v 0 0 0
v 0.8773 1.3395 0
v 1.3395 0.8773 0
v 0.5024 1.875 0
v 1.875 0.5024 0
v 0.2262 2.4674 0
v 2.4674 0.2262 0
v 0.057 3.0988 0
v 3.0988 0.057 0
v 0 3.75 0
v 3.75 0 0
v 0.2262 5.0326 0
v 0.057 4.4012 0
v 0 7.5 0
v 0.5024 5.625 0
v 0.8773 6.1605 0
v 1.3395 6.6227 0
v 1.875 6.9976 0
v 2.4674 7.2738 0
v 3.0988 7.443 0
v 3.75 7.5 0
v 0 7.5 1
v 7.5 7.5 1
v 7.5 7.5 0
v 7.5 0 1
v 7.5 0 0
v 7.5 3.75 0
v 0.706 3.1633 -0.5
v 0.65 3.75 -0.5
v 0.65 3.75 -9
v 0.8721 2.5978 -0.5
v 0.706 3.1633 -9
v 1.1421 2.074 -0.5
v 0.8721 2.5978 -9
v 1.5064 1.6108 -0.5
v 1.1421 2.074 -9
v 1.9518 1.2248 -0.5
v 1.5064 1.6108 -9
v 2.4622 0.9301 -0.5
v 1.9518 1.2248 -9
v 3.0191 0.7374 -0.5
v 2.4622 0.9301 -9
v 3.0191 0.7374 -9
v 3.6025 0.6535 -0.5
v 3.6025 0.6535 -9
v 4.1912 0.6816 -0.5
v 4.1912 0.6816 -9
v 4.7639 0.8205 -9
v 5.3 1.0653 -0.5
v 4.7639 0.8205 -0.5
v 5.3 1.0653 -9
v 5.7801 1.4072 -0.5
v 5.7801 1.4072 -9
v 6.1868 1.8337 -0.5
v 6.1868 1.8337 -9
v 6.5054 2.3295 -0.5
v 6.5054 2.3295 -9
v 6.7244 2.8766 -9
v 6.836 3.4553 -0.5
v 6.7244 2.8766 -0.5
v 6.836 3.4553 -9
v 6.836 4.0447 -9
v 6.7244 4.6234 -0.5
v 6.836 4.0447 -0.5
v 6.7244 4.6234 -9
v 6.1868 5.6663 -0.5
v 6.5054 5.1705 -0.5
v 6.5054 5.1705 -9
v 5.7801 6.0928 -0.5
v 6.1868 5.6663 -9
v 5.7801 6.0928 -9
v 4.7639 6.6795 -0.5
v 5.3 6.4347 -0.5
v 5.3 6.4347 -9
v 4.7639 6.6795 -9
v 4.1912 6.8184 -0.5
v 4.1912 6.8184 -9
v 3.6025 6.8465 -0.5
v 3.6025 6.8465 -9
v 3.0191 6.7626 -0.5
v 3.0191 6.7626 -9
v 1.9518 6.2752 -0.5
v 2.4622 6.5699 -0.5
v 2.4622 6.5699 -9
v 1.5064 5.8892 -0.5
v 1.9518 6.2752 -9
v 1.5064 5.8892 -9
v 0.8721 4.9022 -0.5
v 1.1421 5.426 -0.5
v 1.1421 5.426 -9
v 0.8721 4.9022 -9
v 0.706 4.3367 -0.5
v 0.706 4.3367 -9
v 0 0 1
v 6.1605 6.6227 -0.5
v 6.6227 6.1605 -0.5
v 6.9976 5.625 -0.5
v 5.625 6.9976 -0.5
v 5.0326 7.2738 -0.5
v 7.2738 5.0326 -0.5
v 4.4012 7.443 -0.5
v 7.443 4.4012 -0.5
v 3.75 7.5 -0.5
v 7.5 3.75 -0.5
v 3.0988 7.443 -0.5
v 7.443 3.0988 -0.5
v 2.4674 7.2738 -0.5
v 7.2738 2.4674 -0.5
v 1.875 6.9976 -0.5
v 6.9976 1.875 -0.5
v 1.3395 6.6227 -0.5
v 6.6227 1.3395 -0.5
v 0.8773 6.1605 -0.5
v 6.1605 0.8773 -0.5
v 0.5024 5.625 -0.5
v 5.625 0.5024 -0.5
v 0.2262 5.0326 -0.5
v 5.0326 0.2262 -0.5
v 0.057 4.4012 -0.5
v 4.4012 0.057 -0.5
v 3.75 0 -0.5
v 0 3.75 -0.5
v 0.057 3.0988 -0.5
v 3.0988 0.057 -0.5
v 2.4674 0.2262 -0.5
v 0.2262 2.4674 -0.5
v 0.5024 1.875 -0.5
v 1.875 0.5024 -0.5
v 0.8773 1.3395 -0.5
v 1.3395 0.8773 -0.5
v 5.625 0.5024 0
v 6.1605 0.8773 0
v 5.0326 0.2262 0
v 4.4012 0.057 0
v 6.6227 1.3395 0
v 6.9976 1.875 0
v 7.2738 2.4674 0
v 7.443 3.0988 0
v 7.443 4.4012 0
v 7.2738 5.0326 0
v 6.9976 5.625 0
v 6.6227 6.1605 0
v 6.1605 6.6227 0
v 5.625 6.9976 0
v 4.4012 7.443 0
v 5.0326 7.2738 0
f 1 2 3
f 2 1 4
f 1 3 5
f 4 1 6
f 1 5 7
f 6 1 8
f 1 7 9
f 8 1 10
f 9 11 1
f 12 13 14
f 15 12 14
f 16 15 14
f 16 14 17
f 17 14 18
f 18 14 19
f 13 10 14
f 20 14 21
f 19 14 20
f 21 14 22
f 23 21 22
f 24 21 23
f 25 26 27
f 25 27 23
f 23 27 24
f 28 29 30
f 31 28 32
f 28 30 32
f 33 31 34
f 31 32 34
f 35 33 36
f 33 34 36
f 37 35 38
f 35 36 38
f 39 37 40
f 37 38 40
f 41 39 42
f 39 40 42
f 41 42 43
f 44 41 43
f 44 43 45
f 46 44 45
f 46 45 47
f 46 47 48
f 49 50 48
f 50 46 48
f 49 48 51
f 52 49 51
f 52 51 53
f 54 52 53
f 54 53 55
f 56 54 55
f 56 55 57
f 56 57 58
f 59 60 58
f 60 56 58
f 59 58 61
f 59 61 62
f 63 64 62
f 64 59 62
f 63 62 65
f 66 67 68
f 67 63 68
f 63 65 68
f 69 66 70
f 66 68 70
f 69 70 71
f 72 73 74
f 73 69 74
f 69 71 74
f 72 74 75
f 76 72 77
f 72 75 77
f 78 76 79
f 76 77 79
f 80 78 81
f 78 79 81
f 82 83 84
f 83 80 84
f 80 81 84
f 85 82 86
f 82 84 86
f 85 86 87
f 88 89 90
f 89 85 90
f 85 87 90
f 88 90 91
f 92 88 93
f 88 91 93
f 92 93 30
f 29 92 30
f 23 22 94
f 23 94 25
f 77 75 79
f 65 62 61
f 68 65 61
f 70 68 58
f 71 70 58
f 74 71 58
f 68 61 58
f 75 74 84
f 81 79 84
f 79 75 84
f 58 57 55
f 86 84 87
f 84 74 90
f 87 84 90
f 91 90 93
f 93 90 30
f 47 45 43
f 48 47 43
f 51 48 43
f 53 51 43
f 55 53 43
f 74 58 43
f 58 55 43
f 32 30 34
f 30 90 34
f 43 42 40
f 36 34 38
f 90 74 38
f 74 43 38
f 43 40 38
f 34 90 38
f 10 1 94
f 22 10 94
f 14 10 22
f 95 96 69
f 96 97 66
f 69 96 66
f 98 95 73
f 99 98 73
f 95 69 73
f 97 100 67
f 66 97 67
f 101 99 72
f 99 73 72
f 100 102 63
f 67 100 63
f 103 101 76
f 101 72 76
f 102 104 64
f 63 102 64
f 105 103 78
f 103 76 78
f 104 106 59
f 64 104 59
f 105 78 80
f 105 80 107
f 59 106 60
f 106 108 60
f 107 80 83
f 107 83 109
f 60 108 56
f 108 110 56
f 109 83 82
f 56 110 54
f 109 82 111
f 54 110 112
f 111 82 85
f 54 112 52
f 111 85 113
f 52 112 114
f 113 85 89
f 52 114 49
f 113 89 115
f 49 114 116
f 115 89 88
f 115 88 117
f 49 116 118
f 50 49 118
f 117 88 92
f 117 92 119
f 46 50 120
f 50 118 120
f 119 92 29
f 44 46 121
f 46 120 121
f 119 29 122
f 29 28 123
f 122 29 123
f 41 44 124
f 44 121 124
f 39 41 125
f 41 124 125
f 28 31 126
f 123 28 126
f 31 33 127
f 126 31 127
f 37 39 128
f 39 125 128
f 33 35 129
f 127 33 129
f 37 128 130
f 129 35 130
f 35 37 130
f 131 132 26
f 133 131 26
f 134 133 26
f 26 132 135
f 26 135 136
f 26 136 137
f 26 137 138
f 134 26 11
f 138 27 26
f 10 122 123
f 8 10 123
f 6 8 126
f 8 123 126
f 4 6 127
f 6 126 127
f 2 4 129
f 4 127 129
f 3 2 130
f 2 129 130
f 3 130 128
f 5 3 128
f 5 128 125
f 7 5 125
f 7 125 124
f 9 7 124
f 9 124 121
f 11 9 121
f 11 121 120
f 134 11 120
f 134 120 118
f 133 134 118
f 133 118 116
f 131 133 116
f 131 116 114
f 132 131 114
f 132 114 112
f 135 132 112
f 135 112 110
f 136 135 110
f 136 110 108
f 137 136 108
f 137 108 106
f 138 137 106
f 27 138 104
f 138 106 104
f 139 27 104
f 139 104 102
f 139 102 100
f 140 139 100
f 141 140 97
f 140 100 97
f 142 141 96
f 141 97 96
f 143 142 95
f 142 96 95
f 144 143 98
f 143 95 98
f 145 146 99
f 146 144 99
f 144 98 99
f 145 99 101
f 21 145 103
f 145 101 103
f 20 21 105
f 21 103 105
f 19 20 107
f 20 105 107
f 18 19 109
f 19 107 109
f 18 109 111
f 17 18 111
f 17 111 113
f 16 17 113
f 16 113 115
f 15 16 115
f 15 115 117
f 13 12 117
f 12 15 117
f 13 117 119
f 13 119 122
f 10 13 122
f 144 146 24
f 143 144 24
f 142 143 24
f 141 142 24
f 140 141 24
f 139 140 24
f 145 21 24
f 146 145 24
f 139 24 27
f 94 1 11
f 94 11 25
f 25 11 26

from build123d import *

# Parameters (mm, degrees)
CIRCLE_R         = 3.75
EXTRUDE001_DEPTH = 1.5
CIRCLE001_R      = 3.1
EXTRUDE_DEPTH    = 10
BOX_W            = 7.5
BOX_H            = 7.5
BOX_DEPTH        = 1


with BuildPart() as extrude001:
    # Circle → Extrude001 (new body)
    with BuildSketch(Plane(origin=(3.75, 3.75, 1), x_dir=(-1, 0, 0), z_dir=(0, 0, 1))):
        Circle(CIRCLE_R)
    extrude(amount=EXTRUDE001_DEPTH)


with BuildPart() as extrude001_1:
    # Extrude001 placement: moved
    add(extrude001.part.moved(Location((0, 0, -1.5))))


with BuildPart() as fusion:
    # Circle001 → Extrude (new body)
    with BuildSketch(Plane(origin=(3.75, 3.75, 1), x_dir=(-1, 0, 0), z_dir=(0, 0, 1))):
        Circle(CIRCLE001_R)
    extrude(amount=EXTRUDE_DEPTH)


with BuildPart() as fusion_1:
    # Extrude placement: moved
    add(fusion.part.moved(Location((0, 0, -10))))

    # Fusion: union Extrude001
    add(extrude001_1.part)


with BuildPart() as perforador_led_5_mm:
    # Box → Box (new body)
    with BuildSketch(Plane.XY):
        with Locations((3.75, 3.75)):
            Rectangle(BOX_W, BOX_H)
    extrude(amount=BOX_DEPTH)

    # Fusion001: union Fusion
    add(fusion_1.part)


solid = perforador_led_5_mm.part
